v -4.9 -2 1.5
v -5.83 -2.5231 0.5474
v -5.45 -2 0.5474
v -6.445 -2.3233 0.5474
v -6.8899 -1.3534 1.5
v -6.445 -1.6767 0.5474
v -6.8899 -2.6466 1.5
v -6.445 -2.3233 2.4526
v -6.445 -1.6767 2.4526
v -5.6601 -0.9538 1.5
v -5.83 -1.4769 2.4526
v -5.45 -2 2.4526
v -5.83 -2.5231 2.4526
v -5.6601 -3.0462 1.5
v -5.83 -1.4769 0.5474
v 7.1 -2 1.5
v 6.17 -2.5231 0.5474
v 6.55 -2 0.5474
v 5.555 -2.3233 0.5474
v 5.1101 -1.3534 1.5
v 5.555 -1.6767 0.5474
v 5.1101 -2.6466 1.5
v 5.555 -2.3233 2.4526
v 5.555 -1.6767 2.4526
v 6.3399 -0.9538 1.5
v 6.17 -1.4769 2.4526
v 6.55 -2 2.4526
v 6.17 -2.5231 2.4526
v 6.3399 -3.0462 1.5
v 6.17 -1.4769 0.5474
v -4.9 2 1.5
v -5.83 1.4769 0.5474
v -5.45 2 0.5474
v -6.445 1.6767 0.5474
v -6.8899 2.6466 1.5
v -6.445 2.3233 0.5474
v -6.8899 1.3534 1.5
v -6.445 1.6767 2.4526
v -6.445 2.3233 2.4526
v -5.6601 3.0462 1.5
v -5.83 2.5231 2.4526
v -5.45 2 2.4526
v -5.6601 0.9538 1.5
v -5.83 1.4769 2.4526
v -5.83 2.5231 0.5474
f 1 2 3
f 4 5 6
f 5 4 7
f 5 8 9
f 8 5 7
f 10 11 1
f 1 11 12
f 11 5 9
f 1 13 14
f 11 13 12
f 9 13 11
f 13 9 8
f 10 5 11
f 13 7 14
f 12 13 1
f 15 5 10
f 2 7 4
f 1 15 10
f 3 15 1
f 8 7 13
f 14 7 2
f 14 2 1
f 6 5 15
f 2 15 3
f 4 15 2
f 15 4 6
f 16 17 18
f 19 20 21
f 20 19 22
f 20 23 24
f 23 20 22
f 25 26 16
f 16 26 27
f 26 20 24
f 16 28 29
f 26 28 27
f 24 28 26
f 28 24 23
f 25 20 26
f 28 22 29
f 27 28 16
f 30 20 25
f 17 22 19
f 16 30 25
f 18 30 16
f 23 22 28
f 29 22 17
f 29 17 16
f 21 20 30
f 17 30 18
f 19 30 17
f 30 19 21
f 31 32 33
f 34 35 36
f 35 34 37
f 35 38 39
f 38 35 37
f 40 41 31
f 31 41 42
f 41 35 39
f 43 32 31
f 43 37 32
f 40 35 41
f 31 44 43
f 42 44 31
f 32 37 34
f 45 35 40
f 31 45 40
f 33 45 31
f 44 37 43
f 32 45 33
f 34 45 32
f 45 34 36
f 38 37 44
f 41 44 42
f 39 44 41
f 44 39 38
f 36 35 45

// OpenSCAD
union() {
	translate([-6, -2, 1.5]) sphere(r=1.1);
	translate([6, -2, 1.5]) sphere(r=1.1);
	translate([-6, 2, 1.5]) sphere(r=1.1);
}
